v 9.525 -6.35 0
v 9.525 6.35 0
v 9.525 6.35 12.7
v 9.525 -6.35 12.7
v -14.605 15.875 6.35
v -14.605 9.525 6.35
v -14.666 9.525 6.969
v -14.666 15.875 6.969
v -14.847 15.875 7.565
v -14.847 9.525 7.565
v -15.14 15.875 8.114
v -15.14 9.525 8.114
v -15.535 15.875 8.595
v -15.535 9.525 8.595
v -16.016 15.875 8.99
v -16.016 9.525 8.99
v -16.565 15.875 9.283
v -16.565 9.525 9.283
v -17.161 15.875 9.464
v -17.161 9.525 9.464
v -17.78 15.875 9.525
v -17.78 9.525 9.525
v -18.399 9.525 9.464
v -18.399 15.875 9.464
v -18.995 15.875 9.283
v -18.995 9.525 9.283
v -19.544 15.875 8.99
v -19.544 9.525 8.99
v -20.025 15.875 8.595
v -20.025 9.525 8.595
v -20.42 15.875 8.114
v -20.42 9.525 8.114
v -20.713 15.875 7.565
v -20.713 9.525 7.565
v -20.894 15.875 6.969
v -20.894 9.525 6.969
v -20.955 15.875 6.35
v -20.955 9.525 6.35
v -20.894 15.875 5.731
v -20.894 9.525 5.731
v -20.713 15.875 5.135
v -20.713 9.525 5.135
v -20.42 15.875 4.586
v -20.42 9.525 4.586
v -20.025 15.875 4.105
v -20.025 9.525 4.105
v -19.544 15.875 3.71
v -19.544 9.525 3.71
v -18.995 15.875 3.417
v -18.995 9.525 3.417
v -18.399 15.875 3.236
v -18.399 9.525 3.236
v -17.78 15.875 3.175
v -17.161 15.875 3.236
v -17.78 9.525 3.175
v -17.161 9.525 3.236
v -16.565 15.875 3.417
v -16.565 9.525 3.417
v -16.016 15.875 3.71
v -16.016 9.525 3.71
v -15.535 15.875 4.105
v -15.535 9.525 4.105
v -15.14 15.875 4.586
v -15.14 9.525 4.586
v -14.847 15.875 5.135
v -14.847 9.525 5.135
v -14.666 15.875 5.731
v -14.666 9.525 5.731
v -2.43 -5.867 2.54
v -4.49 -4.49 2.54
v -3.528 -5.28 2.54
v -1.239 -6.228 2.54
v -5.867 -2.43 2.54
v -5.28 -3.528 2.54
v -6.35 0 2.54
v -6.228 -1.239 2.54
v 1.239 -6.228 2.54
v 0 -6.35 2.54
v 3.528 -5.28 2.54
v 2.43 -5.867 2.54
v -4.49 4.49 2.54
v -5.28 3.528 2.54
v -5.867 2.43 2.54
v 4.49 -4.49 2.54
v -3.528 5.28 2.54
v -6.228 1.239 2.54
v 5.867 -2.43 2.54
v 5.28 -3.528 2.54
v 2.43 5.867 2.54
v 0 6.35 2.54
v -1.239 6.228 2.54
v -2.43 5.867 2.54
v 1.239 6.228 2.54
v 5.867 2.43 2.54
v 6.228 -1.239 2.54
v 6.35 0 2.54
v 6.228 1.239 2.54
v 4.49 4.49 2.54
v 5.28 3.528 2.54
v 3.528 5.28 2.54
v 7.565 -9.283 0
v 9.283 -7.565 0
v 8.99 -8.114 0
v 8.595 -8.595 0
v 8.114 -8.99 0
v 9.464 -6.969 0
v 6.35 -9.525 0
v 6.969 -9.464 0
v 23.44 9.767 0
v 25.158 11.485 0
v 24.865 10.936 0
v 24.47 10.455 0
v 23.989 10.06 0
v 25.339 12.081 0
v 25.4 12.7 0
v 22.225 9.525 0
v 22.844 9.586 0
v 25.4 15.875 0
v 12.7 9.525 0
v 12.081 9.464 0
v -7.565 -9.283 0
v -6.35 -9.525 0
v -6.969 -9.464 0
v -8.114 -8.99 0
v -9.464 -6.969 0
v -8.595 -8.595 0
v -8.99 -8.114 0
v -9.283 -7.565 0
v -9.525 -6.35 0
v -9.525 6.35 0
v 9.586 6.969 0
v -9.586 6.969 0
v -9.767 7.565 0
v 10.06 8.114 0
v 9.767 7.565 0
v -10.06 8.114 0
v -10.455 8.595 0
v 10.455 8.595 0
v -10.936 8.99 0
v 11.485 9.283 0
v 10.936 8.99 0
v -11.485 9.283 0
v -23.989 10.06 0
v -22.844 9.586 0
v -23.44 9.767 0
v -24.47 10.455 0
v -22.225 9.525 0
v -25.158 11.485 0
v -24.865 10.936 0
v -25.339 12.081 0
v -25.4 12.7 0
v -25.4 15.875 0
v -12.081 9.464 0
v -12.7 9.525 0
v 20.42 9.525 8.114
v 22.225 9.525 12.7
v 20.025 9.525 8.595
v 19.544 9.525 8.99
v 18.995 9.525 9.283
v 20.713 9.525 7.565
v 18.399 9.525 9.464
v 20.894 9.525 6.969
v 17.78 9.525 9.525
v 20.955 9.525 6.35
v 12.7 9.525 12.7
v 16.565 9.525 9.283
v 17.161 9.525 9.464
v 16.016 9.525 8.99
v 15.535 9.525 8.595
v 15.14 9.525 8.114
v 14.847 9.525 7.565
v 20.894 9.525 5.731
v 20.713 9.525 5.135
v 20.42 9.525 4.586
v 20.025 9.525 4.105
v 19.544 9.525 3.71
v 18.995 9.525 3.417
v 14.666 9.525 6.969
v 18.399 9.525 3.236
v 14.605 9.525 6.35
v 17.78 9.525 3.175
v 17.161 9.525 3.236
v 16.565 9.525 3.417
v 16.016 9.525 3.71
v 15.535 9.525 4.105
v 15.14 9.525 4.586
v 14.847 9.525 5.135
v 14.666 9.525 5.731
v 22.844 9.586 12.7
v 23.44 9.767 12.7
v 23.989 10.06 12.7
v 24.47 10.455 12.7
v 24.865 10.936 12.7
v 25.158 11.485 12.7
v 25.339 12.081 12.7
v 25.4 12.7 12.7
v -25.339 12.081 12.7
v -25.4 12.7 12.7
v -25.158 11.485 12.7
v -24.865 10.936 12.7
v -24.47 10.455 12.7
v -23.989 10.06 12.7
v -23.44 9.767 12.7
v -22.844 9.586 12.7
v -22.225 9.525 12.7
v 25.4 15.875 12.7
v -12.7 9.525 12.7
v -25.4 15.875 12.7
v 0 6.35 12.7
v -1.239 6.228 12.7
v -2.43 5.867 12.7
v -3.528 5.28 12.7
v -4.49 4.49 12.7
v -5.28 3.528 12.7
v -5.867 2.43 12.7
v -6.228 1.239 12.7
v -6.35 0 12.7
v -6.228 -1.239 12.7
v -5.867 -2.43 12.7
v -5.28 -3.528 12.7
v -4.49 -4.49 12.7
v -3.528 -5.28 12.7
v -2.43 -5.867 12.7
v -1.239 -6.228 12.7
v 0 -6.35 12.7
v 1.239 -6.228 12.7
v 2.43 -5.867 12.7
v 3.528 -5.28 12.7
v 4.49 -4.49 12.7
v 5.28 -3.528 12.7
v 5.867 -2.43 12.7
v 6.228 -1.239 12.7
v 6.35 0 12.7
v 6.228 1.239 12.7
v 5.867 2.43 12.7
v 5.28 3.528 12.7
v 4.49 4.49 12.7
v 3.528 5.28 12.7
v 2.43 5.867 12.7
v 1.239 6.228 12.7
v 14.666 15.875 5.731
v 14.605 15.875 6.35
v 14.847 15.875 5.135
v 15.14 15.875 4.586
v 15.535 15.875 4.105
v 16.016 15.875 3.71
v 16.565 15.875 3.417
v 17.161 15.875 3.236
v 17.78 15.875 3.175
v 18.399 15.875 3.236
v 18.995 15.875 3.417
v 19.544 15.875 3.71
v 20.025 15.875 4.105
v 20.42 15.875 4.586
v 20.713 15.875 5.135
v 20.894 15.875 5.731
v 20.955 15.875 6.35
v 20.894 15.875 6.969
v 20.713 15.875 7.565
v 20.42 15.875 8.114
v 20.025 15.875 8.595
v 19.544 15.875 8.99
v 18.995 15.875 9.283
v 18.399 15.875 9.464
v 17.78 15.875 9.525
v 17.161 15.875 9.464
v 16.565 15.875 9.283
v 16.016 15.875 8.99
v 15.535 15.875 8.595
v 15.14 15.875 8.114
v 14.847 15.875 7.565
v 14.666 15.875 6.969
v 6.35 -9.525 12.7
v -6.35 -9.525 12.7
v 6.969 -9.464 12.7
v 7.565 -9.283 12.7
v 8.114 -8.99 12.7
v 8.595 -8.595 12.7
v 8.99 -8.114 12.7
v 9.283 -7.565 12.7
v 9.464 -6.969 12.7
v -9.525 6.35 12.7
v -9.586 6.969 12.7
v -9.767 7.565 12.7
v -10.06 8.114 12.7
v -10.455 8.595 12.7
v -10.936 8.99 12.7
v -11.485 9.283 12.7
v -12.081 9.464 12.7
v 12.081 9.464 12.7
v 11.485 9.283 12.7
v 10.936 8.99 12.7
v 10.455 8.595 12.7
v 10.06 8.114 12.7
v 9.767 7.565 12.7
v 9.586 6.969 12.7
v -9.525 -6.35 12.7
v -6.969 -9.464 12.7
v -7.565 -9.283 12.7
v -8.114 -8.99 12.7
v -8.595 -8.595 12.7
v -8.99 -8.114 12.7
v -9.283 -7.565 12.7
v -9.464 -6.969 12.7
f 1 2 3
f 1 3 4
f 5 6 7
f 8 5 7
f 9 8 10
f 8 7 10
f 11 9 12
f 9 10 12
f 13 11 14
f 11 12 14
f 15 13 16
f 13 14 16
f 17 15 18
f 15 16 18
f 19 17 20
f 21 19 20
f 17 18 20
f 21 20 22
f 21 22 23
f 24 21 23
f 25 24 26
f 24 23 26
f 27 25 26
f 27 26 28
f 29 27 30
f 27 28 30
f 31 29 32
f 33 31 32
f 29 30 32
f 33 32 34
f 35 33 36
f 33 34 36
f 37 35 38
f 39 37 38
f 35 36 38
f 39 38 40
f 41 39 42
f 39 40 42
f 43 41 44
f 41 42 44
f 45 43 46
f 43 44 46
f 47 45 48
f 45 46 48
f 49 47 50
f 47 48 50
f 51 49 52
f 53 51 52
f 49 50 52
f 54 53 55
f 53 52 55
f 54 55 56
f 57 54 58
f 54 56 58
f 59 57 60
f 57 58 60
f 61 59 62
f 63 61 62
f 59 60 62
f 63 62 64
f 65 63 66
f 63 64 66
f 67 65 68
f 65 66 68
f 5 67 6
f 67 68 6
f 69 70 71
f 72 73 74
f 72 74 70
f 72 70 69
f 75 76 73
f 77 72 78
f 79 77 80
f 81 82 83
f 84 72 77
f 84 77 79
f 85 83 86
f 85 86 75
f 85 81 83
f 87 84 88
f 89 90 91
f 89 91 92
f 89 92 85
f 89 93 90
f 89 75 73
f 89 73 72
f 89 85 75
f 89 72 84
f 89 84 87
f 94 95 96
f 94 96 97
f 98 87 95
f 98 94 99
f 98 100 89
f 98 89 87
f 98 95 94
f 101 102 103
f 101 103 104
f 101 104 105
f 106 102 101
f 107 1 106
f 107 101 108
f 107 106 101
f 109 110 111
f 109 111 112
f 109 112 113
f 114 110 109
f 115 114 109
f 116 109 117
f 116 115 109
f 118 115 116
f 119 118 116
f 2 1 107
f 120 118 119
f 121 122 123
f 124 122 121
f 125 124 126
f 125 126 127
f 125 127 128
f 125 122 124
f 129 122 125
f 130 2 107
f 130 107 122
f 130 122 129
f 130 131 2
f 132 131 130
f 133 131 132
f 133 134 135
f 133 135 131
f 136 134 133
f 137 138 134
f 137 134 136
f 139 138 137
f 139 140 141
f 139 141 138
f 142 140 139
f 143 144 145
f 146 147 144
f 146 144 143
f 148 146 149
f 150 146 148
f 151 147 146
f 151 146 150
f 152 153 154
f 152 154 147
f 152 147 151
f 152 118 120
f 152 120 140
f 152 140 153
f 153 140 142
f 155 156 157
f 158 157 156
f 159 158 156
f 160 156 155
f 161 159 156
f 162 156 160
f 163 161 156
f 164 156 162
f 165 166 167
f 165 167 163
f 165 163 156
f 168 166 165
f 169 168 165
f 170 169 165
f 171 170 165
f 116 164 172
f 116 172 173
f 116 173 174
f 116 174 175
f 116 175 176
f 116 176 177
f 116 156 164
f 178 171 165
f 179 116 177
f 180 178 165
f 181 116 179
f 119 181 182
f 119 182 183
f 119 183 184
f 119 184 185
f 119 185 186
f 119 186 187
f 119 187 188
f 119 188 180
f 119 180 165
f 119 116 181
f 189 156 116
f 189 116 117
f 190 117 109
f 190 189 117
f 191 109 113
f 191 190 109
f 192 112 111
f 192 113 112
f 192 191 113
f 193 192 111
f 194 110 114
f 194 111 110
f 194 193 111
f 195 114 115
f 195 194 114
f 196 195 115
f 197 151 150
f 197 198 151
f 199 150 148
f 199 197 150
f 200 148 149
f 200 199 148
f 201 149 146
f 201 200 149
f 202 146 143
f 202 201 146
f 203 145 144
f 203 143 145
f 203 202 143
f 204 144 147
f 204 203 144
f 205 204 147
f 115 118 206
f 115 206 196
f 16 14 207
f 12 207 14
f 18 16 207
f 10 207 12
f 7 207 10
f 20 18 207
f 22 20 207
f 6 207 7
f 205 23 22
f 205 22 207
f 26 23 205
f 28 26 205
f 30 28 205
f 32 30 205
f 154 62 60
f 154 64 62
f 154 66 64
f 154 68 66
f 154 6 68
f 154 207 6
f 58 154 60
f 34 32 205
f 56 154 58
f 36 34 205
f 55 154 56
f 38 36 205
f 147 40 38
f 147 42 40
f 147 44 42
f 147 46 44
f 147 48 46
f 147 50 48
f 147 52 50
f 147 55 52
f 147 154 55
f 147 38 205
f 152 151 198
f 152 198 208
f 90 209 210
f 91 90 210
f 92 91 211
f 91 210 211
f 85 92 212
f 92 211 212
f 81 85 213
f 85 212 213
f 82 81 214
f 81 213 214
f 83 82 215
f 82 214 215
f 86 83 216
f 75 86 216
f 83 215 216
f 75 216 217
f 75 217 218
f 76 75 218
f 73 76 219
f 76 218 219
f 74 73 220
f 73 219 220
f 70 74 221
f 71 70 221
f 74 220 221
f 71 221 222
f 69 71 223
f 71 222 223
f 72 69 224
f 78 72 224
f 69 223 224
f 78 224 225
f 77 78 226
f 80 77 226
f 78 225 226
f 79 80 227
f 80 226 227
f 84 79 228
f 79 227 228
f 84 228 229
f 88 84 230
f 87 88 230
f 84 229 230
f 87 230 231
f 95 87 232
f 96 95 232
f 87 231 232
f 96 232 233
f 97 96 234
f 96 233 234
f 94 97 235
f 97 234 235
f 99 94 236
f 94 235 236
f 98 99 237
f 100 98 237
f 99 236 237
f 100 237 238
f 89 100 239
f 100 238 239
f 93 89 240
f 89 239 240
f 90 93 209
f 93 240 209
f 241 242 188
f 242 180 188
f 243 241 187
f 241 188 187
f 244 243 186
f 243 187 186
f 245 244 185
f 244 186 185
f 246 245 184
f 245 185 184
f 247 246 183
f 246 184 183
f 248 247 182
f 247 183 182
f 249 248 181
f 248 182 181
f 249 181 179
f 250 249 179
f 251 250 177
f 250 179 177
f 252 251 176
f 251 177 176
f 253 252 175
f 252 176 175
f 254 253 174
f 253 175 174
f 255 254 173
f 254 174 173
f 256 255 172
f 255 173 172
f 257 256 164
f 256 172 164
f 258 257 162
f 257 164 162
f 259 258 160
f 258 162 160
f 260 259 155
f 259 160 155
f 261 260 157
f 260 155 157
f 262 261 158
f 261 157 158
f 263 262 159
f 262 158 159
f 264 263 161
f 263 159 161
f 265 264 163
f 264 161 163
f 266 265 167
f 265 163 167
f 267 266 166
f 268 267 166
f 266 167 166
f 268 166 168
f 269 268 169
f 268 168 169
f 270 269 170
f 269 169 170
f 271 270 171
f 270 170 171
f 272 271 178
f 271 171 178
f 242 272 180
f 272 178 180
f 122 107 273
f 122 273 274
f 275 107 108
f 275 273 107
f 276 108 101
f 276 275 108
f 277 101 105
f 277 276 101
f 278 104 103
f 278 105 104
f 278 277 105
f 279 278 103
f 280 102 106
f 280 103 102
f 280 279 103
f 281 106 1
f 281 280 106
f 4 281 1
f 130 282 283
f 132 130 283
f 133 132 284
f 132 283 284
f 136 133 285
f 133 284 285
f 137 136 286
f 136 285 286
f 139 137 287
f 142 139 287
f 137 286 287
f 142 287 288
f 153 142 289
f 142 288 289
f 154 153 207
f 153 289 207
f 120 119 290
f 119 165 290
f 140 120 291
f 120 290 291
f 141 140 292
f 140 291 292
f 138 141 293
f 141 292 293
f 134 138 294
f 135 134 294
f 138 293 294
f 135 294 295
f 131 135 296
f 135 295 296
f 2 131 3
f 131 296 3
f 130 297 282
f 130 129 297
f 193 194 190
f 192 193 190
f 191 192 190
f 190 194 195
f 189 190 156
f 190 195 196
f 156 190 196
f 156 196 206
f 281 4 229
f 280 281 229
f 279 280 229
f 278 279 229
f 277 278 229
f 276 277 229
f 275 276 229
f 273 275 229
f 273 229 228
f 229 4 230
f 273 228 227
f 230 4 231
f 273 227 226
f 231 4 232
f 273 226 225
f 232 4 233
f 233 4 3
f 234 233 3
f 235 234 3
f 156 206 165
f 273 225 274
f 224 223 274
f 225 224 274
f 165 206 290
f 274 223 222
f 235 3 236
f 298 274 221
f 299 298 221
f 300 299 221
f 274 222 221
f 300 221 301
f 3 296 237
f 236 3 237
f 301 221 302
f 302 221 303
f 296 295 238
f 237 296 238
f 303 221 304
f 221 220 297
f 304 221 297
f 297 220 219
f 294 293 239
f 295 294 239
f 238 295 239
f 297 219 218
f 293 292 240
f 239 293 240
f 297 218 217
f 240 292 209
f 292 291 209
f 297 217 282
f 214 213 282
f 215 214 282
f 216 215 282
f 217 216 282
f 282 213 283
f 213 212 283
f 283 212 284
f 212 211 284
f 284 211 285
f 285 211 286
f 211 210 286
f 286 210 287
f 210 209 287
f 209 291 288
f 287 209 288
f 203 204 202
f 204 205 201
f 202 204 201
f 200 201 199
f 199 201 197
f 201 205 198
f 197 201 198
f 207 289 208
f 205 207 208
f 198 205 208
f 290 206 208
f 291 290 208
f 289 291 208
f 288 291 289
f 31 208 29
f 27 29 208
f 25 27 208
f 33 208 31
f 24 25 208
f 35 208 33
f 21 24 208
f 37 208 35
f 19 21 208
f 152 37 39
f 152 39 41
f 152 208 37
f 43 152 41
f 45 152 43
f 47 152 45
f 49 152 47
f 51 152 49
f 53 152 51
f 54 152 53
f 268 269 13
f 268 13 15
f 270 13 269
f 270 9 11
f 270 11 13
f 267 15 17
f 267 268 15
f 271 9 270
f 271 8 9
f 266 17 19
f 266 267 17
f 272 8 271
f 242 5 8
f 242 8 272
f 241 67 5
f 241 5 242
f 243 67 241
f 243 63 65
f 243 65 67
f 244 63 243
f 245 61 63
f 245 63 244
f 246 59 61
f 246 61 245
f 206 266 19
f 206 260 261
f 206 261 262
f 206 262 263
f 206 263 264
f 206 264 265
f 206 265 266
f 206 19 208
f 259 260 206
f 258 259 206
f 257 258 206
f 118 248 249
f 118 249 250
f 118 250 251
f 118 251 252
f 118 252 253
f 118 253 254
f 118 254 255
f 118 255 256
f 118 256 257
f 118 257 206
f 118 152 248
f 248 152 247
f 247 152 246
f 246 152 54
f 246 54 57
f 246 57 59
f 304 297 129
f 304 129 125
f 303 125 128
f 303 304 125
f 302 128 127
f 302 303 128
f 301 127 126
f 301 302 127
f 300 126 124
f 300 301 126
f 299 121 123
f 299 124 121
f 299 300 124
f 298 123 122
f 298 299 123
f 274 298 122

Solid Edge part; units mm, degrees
sketch "Sketch1" plane through (0, 0, 0) normal (0, 0, 1) x (1, 0, 0)
  line L0 (-25.4, 15.875) -> (25.4, 15.875)
  line L1 (25.4, 15.875) -> (25.4, 9.525)
  line L2 (25.4, 9.525) -> (9.525, 9.525)
  line L3 (9.525, 9.525) -> (9.525, -9.525)
  line L4 (9.525, -9.525) -> (-9.525, -9.525)
  line L5 (-9.525, -9.525) -> (-9.525, 9.525)
  line L6 (-9.525, 9.525) -> (-25.4, 9.525)
  line L7 (-25.4, 9.525) -> (-25.4, 15.875)
  dimension "D1" = 6.35
  dimension "D2" = 19.05
  dimension "D3" = 6.35
  dimension "D4" = 50.8
  dimension "D5" = 15.875
  dimension "D6" = 15.875
  dimension "D7" = 19.05
  dimension "D8" = 19.05
extrude "Protrusion1" add sketch "Sketch1" along normal blind 12.7
fillet "Round_1" radius 3.175 6 edges at (9.525, 9.525, 6.35) (9.525, -9.525, 6.35) (-9.525, -9.525, 6.35) (25.4, 9.525, 6.35) (-9.525, 9.525, 6.35) (-25.4, 9.525, 6.35)
sketch "Sketch2" plane through (0, 3.175, 12.7) normal (0, 0, 1) x (0, 1, 0)
  circle A0 centre (-3.175, 0) radius 6.35
extrude "PivotHole" cut sketch "Sketch2" against normal blind 10.16
sketch "Sketch3" plane through (-17.4625, 9.525, 6.35) normal (0, -1, 0) x (1, 0, 0)
  circle A0 centre (-0.3175, 0) radius 3.175
  dimension "D1" = 4.445
  dimension "D2" = 6.35
  dimension "D3" = 7.62
extrude "v_1" cut sketch "Sketch3" against normal blind 25.4
mirror "Mirror1" about plane through (0, 0, 0) normal (1, 0, 0) of "v_1"
properties material "Aluminum, 6061-T6"
